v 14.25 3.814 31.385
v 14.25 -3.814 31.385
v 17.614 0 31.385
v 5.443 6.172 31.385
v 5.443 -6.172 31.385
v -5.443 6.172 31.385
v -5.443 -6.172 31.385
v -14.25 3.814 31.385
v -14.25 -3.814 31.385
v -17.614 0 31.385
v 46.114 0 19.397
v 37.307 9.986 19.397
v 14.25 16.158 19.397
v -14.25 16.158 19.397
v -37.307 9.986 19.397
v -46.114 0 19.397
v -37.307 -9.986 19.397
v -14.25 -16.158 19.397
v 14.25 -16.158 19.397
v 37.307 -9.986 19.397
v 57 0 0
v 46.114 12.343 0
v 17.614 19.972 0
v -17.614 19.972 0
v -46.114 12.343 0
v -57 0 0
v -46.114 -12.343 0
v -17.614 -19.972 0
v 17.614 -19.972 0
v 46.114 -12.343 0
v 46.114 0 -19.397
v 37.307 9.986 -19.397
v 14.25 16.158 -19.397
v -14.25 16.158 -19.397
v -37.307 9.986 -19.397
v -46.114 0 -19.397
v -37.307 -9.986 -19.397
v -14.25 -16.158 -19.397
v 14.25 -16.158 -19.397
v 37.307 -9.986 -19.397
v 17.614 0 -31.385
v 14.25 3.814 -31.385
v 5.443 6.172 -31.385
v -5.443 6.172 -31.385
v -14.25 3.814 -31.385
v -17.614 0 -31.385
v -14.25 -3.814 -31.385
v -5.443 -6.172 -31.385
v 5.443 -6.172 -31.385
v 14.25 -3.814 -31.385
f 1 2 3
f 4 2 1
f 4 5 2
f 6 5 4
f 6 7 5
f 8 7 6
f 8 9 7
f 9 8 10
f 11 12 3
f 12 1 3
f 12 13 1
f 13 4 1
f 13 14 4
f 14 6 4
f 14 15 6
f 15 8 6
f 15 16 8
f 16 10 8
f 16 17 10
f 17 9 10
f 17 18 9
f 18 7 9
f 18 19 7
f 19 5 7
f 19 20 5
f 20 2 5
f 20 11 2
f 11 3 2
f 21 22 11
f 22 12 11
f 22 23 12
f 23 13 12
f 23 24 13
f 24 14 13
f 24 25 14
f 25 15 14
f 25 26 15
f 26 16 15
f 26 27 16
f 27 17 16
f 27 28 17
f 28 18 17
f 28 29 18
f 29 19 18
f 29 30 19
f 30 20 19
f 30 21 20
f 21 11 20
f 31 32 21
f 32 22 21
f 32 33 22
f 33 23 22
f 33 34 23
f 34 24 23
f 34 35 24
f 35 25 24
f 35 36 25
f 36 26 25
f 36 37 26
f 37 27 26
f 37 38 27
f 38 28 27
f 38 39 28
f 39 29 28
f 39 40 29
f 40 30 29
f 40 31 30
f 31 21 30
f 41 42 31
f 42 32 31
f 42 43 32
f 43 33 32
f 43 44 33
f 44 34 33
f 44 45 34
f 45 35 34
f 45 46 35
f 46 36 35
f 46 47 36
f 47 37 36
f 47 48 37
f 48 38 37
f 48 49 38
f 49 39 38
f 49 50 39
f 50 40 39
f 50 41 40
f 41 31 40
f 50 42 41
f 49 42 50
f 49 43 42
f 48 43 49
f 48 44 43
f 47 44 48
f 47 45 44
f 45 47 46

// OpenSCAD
// Generated by SolidPython 1.0.1 on 2020-07-29 00:46:53


scale(v = [19, 7, 11]) {
	sphere(r = 3);
}
/***********************************************
*********      SolidPython code:      **********
************************************************
 
# import packages: SolidPython
from solid import *
from solid.utils import *
from itertools import chain, combinations, permutations


class Resize:

    def __init__(self, scad_file):
        self.scad_file = scad_file
        #self.scad_file = import_scad(scad_file)
        # cone/cylinder param:
        self.r1 = 0
        self.r2 = 0
        self.h = 0
        # rectangular prism param:
        self.w = 0
        self.l = 0
        # ellipse param:
        self.r = 0

    # import OpenScad code (file name corresponds to shape)


    # classify shape + parameters
    def assign(self, param1, param2, param3):
        if self.scad_file == 'cone.scad':
            self.r1 = param1
            self.r2 = param2
            self.h = param3
        elif self.scad_file == 'cylinder.scad':
            self.r1 = param1
            self.r2 = param2
            self.h = param3
        elif self.scad_file == 'rectangularPrism.scad':
            self.h = param1
            self.l = param2
            self.w = param3
        else:
            self.r = param1
            self.h = param2

    # resize parameters
    def iterate(self):
        x = range(3, 20, 2)
        i = 1
        if self.scad_file == 'cone.scad':
            tempList = list(permutations(x, 2))
            for temp in tempList:
                param1 = temp[0]
                param2 = temp[1]
                filepath = 'produced_scad_files/' + 'cone' + str(param1) + '_' + str(param2) + '_' + '.scad'
                scad_render_to_file(cylinder(h=param1, r1=param2, r2=0), filepath)

        elif self.scad_file == 'cylinder.scad':
            tempList = list(permutations(x, 3))
            for temp in tempList:
                param1 = temp[0]
                param2 = temp[1]
                filepath = 'produced_scad_files/' + 'cylinder' + str(param1) + '_' + str(param2) + '_' + '.scad'
                scad_render_to_file(cylinder(h=param1, r1=param2, r2=param2), filepath)

        elif self.scad_file == 'rectangularPrism.scad':
            tempList = list(permutations(x, 3))
            for temp in tempList:
                param1 = temp[0]
                param2 = temp[1]
                param3 = temp[2]
                filepath = 'produced_scad_files/' + 'rectangularPrism' + str(param1) + '_' + str(param2) + '_' + str(
                    param3) + '.scad'
                scad_render_to_file(cube(size=(param1, param2, param3)), filepath)

        elif self.scad_file == 'ellipse.scad':
            tempList = list(permutations(x, 4))
            for temp in tempList:
                param1 = temp[0]
                param2 = temp[1]
                param3 = temp[2]
                param4 = temp[3]
                filepath = 'produced_scad_files/' + 'ellipse' + str(param1) + '_' + str(param2) + '_' + str(param3) + '_' + str(param4) + '.scad'
                scad_render_to_file(scale([param1, param2, param3])(sphere(r=param4)), filepath)

    def render_to_scadfile(self):
        scad_render_to_file(scad, 'example.scad') 
 
************************************************/
